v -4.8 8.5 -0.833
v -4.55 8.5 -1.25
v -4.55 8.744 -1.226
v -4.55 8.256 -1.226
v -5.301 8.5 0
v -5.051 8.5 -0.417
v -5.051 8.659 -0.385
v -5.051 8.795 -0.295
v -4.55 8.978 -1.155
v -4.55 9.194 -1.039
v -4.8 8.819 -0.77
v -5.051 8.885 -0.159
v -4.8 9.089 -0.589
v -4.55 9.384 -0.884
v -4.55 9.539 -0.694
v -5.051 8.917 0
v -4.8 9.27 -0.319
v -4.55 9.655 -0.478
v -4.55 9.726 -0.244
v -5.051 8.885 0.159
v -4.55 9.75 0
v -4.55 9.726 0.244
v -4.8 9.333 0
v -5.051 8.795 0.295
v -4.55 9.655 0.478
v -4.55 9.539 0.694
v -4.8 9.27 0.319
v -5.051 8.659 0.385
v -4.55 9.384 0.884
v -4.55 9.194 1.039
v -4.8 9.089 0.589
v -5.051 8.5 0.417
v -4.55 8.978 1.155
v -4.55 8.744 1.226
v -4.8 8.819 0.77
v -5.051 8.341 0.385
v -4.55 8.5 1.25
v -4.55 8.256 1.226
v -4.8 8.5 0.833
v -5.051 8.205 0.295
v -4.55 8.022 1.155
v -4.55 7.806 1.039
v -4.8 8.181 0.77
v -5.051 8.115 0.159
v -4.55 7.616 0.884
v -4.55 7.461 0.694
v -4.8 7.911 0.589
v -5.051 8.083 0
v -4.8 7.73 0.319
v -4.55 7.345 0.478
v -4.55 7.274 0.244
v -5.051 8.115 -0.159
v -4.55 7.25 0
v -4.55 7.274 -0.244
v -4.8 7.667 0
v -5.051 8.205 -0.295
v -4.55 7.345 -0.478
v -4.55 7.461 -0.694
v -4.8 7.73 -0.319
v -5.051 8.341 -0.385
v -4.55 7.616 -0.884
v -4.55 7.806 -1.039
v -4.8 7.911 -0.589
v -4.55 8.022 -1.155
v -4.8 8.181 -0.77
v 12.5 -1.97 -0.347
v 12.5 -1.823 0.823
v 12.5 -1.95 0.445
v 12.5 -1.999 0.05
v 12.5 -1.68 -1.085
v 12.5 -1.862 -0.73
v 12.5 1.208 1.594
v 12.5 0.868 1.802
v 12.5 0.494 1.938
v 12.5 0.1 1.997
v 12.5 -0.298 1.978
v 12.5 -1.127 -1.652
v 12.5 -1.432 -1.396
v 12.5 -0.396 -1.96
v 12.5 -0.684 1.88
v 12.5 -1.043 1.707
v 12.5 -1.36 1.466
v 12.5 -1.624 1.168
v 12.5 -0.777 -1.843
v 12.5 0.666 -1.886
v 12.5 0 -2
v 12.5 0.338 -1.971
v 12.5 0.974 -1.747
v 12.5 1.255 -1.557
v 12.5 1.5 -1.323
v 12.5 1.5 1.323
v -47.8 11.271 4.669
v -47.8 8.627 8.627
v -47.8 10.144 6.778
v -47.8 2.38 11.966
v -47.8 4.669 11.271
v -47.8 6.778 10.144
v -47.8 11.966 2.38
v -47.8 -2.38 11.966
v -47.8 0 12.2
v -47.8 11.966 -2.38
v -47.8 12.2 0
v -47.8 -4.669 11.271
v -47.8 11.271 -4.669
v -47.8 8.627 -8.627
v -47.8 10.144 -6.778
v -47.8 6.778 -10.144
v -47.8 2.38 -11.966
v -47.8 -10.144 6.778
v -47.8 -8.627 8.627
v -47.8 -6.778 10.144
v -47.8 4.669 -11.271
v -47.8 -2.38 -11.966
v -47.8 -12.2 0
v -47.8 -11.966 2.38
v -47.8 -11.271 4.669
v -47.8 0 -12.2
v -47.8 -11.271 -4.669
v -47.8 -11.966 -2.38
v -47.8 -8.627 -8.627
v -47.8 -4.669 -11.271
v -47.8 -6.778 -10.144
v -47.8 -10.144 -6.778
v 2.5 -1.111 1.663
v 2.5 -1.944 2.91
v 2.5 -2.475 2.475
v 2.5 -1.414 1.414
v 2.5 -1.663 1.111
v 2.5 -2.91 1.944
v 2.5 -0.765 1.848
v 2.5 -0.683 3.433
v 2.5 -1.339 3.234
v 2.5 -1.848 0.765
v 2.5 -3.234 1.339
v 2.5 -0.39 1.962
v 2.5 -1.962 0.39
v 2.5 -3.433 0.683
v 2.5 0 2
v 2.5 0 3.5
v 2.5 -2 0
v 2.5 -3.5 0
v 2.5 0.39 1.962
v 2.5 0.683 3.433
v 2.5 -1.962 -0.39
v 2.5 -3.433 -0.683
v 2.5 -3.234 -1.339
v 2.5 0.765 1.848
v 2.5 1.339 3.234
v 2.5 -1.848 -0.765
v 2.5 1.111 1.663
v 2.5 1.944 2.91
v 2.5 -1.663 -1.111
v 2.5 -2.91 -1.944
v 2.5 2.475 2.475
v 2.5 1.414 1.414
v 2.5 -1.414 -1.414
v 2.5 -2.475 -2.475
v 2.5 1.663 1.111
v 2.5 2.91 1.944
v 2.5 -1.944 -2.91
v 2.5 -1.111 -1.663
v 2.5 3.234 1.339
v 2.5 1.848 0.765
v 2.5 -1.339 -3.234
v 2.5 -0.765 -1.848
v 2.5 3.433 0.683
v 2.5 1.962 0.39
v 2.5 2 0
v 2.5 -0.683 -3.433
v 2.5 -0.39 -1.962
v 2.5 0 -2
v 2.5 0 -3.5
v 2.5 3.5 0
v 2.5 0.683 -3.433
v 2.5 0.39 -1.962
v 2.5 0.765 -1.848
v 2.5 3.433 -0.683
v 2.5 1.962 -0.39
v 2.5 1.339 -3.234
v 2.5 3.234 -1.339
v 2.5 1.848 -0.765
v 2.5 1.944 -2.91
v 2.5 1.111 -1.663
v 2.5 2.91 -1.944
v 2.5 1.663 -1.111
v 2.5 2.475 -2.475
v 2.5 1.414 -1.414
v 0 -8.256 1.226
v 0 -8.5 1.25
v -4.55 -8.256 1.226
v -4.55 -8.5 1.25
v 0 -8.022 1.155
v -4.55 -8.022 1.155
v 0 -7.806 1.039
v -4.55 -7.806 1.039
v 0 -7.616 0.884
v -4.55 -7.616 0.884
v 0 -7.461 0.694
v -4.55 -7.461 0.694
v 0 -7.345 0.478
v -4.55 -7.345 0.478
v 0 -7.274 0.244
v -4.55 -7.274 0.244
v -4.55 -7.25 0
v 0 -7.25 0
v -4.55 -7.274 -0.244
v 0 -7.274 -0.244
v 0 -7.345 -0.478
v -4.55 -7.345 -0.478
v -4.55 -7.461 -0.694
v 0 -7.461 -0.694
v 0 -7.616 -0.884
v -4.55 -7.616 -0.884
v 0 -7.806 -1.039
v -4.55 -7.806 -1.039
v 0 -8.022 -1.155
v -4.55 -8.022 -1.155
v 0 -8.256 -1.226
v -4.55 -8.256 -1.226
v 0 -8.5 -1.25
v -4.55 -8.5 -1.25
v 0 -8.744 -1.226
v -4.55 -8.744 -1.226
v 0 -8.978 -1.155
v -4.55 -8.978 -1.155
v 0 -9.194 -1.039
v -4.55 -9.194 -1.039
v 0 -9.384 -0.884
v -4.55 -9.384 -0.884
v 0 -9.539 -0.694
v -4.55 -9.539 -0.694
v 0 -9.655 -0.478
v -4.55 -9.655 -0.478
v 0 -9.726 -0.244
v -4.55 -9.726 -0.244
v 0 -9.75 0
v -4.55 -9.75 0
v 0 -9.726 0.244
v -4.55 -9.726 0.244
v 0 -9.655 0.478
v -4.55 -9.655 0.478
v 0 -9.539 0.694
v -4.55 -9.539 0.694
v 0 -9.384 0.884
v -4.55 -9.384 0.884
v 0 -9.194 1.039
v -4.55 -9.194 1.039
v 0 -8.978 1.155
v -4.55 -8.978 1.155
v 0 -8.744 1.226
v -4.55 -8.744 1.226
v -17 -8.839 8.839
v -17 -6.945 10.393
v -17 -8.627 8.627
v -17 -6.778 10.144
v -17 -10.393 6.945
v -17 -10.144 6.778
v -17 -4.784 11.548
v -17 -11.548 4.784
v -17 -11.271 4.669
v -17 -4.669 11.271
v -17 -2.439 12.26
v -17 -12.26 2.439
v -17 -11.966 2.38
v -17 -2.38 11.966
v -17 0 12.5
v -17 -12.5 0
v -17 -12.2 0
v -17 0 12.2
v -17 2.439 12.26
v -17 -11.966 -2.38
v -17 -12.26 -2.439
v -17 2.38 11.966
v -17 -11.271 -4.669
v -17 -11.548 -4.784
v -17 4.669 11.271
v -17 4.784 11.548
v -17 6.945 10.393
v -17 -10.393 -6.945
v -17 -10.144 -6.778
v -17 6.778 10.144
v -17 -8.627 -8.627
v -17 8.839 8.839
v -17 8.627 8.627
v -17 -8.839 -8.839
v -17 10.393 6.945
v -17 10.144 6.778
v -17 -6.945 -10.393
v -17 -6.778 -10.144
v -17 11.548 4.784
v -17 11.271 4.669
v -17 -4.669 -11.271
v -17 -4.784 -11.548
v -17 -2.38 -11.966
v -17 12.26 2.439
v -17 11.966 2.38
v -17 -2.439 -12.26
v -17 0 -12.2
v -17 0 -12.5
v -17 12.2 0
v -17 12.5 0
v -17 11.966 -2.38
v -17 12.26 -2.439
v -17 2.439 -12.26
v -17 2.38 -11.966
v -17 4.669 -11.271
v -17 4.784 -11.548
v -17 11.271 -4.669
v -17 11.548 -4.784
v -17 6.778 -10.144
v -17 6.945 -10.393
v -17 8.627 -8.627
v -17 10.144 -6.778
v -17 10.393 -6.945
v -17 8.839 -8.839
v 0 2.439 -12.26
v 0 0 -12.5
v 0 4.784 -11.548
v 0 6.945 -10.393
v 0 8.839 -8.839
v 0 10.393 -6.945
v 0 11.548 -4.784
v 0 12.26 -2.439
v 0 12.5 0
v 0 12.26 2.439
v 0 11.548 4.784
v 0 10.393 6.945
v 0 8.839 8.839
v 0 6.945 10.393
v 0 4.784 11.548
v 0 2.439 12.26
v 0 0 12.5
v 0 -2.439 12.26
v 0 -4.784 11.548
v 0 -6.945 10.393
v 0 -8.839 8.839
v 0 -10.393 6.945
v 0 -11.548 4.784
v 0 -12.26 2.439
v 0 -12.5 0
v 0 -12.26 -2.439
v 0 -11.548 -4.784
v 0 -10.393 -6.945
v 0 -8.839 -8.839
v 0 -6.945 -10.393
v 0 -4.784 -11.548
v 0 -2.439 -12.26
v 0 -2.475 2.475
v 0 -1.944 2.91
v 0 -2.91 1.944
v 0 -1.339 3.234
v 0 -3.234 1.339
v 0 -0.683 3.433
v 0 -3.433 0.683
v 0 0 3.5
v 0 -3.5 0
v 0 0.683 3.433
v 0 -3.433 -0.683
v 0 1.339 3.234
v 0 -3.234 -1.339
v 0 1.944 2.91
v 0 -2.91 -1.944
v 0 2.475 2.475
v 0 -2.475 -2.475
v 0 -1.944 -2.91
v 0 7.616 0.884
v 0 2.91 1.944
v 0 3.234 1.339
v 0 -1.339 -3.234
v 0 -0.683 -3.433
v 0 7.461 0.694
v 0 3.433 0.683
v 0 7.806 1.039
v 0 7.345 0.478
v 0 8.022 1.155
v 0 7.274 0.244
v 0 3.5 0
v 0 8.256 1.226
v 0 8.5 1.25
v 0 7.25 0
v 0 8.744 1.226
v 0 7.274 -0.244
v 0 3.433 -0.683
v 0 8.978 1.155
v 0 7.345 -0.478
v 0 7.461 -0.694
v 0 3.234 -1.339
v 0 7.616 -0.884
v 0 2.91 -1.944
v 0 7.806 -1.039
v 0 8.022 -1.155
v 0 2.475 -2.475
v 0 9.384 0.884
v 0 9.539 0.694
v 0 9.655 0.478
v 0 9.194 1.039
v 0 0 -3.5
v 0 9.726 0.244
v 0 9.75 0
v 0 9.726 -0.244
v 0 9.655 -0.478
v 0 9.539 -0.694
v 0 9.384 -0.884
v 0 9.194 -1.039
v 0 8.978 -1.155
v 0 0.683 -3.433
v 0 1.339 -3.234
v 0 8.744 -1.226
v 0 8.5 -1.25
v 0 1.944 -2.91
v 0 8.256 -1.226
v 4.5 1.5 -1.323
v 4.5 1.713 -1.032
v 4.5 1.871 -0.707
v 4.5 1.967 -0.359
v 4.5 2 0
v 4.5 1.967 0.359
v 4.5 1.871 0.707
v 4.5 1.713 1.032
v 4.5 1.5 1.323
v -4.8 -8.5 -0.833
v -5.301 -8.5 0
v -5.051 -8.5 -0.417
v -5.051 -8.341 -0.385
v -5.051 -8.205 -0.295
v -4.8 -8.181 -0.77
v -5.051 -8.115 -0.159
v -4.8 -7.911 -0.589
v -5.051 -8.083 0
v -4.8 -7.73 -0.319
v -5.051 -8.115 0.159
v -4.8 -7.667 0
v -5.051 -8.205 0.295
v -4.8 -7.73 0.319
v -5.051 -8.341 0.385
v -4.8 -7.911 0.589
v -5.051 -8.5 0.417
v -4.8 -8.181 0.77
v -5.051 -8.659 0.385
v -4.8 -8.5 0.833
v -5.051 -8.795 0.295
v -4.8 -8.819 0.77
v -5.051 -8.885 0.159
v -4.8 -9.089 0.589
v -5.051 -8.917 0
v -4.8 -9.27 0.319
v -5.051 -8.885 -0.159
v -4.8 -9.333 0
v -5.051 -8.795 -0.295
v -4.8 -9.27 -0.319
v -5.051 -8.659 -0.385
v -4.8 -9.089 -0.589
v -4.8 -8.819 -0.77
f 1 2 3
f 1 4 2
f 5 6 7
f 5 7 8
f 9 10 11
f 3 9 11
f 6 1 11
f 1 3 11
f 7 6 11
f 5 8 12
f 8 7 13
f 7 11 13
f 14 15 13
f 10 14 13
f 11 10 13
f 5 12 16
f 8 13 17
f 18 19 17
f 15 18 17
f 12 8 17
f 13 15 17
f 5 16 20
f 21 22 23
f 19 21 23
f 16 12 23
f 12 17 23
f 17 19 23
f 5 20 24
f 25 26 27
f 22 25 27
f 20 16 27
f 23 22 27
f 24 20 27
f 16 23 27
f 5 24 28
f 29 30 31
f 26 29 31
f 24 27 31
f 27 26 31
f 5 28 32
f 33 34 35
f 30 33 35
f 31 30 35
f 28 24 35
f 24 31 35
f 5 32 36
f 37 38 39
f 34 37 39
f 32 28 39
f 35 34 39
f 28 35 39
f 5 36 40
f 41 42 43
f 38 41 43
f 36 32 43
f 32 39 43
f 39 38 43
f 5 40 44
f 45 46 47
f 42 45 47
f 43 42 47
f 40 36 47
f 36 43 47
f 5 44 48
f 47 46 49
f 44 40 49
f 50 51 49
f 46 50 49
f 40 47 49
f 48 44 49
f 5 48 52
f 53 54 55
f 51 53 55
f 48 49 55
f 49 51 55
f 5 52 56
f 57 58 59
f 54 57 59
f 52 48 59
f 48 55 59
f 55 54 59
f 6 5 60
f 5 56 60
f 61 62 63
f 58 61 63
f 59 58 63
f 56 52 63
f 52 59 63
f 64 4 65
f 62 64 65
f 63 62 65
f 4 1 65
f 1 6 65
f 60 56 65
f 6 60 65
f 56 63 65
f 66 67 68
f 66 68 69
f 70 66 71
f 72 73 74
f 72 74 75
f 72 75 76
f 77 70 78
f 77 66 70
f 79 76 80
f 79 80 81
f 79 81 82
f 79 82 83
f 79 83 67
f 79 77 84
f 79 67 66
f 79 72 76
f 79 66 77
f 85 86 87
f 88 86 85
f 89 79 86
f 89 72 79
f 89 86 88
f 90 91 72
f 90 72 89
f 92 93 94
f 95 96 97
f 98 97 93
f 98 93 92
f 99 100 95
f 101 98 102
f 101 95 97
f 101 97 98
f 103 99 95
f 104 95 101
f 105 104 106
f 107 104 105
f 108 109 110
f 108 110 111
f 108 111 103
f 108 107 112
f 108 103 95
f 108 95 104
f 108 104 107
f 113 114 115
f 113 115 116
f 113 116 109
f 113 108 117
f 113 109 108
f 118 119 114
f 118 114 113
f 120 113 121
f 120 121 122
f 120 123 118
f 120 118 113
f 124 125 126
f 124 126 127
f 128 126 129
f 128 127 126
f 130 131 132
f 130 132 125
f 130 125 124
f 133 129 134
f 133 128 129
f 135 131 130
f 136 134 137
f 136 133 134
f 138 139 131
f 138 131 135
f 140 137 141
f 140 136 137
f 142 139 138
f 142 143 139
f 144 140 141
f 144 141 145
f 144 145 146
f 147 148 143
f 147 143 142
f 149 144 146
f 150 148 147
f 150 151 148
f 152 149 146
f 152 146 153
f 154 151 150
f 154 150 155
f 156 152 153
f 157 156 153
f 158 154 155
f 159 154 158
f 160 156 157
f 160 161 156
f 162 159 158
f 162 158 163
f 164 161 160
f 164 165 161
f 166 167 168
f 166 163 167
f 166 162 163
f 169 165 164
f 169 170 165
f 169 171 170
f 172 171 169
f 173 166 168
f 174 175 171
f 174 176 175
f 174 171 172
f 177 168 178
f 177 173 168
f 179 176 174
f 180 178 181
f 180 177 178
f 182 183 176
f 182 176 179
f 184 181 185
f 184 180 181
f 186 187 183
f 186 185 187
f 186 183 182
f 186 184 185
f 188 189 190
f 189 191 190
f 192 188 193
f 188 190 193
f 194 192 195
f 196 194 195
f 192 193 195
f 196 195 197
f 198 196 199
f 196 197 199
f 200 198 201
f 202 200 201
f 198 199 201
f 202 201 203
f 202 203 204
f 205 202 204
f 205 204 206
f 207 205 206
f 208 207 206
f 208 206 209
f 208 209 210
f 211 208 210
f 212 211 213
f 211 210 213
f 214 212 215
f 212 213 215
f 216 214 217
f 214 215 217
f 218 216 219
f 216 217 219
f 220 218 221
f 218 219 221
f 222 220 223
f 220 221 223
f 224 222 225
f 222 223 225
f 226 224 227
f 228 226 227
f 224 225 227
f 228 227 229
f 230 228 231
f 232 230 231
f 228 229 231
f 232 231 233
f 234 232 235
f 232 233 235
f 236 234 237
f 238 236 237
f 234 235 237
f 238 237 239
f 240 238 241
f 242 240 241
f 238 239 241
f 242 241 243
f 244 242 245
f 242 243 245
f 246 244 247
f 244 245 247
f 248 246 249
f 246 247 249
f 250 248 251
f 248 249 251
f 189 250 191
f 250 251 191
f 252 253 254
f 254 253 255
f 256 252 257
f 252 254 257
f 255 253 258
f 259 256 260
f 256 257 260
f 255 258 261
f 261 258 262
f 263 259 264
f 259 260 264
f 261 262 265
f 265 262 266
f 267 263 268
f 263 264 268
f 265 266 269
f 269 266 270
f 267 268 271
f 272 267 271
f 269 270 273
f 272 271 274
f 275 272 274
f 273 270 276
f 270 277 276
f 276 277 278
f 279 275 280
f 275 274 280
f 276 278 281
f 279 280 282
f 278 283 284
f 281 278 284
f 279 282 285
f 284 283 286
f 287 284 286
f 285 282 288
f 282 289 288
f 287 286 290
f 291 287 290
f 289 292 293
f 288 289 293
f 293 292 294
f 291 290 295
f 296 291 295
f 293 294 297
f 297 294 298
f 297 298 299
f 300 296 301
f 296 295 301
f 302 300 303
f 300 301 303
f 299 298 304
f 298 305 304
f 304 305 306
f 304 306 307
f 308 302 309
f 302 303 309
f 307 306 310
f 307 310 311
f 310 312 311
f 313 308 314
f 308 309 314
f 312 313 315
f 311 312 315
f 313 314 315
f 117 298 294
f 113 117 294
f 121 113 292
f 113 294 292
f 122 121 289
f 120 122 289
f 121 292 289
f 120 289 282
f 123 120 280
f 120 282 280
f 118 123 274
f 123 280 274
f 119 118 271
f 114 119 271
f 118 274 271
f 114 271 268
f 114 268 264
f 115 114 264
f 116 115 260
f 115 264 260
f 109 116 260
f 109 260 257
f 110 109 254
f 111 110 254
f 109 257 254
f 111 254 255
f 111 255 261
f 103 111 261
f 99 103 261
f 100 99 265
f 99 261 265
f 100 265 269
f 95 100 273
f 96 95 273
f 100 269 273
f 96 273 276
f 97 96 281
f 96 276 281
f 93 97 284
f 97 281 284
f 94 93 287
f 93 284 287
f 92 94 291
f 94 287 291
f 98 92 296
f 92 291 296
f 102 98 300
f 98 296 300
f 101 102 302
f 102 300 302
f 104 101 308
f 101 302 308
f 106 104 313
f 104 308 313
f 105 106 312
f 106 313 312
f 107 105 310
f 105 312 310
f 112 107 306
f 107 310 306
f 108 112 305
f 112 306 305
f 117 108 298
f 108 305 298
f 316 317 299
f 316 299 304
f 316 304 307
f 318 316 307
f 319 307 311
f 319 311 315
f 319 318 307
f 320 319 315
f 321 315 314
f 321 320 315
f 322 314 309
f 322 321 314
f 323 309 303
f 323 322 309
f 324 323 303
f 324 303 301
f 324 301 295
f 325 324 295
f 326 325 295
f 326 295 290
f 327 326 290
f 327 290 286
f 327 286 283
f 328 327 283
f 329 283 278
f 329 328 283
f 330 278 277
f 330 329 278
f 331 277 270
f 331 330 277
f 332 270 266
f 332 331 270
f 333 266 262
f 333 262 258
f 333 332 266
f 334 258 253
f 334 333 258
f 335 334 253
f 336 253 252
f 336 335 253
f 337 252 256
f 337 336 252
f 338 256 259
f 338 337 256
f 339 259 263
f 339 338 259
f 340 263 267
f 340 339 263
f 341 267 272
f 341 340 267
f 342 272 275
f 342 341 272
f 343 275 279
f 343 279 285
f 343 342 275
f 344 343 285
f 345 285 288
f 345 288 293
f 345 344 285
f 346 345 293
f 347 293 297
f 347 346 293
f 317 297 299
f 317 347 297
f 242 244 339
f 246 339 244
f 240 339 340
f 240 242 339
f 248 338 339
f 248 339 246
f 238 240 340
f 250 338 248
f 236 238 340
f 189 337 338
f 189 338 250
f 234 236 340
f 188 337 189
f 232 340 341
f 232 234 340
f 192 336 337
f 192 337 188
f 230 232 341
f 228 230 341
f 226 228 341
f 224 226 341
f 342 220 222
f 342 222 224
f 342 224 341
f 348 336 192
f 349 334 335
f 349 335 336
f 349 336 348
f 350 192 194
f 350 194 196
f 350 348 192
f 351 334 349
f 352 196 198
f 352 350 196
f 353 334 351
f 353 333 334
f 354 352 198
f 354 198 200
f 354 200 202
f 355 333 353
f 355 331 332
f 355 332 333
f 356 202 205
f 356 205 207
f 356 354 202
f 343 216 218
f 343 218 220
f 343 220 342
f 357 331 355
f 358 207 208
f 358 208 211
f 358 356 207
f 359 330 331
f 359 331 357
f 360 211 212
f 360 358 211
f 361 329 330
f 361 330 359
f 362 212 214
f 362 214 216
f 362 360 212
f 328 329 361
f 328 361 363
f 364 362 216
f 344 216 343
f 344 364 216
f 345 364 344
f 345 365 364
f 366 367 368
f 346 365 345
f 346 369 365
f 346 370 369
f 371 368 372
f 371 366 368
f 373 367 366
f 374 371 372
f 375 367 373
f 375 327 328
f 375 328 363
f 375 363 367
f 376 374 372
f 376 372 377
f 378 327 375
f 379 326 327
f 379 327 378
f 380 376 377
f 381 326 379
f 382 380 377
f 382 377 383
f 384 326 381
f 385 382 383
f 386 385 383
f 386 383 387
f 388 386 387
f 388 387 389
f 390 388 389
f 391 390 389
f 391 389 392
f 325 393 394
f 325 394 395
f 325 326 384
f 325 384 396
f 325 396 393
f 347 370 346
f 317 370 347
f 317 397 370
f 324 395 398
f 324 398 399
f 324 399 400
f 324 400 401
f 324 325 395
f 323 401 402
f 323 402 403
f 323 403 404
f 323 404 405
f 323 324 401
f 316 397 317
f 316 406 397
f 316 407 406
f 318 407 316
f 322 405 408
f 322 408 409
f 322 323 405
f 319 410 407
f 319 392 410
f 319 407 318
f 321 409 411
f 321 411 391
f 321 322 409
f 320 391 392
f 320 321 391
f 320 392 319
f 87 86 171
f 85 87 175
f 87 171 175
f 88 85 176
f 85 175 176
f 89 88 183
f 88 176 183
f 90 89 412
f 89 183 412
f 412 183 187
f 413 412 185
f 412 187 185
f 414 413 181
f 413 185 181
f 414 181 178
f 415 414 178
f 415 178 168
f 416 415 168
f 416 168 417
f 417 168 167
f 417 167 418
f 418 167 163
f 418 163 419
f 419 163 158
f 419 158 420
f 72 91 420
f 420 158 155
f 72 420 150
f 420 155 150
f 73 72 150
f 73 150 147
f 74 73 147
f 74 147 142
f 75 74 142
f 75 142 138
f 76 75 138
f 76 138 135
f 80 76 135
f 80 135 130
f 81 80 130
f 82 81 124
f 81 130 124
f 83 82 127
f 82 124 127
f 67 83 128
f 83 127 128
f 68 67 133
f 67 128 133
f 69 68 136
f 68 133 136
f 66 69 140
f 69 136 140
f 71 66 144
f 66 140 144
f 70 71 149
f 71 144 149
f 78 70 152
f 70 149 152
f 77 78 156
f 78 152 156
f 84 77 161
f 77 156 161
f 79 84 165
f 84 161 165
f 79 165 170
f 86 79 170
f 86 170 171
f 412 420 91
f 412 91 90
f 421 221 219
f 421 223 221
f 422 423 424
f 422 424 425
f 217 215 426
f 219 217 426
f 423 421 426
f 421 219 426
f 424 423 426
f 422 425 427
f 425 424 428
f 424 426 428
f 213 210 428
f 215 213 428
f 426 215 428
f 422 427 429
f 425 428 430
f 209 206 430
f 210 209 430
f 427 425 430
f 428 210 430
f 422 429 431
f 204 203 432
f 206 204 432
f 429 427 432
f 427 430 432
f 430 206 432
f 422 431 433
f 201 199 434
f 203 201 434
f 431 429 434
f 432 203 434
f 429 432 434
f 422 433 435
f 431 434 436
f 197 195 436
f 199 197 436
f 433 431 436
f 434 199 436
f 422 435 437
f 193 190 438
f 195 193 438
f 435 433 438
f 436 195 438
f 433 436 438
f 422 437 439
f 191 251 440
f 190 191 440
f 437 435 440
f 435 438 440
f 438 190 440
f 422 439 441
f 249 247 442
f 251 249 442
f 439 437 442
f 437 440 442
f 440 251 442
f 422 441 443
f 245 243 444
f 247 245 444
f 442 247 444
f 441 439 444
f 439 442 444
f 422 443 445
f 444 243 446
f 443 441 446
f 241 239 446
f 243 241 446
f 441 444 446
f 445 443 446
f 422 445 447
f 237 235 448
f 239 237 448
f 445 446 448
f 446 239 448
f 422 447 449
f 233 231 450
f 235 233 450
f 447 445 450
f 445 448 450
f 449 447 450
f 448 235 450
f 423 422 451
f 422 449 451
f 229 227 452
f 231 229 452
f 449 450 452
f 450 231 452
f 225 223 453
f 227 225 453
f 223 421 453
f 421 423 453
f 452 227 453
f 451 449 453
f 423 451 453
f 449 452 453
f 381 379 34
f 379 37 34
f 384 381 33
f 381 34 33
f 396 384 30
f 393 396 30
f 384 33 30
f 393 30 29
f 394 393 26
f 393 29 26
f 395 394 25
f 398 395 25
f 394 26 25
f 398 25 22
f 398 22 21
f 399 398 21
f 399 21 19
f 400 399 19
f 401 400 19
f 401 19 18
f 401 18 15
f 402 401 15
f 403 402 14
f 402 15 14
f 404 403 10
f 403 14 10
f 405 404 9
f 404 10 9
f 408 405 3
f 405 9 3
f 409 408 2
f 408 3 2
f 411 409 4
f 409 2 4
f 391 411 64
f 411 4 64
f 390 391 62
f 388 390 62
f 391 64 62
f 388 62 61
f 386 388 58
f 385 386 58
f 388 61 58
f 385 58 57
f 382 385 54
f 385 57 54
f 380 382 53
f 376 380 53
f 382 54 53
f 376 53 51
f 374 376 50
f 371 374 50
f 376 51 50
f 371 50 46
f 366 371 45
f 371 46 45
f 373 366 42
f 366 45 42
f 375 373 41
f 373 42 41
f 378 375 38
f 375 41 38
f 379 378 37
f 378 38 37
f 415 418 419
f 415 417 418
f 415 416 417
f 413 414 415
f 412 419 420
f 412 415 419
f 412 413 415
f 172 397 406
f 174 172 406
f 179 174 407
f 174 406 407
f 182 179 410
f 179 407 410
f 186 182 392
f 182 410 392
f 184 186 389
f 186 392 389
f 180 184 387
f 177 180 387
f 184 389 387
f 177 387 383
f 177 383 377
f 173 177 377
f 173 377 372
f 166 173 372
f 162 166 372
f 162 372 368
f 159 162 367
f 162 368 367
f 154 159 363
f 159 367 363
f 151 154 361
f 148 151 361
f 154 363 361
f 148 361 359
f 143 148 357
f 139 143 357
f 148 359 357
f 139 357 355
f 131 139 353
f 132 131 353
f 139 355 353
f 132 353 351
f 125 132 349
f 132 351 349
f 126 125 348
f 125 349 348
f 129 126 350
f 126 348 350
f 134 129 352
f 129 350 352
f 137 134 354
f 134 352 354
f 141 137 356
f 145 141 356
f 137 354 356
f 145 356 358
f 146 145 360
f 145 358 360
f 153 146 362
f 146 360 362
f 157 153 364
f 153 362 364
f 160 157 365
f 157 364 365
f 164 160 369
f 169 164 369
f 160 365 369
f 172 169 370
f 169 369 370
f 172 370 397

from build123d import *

# Parameters (mm, degrees)
SKETCH2_R               = 12.5
BOSS_EXTRUDE1_DEPTH     = 17
SKETCH3_R               = 12.2
BOSS_EXTRUDE2_DEPTH     = 30.8
SKETCH4_R               = 3.5
BOSS_EXTRUDE3_DEPTH     = 2.5
SKETCH5_R               = 2
BOSS_EXTRUDE4_DEPTH     = 10
CUT_EXTRUDE1_DEPTH      = 63.837807091
CUT_EXTRUDE1_DEPTH_BACK = 8
M3_TAPPED_HOLE1_D       = 2.5
M3_TAPPED_HOLE1_DEPTH   = 4.55
M3_TAPPED_HOLE1_TIP     = 0.751075774


with BuildPart() as part:
    # Sketch2 → Boss-Extrude1 (new body)
    with BuildSketch(Plane(origin=(0, 0, 0), x_dir=(0, 0, -1), z_dir=(1, 0, 0))):
        Circle(SKETCH2_R)
    extrude(amount=-BOSS_EXTRUDE1_DEPTH)

    # Sketch3 → Boss-Extrude2 (add)
    with BuildSketch(Plane.ZY.offset(17)):
        with Locations(Location((0, 0, 0), (0, 0, 180))):
            Circle(SKETCH3_R)
    extrude(amount=BOSS_EXTRUDE2_DEPTH)

    # Sketch4 → Boss-Extrude3 (add)
    with BuildSketch(Plane(origin=(0, 0, 0), x_dir=(0, 0, -1), z_dir=(1, 0, 0))):
        Circle(SKETCH4_R)
    extrude(amount=BOSS_EXTRUDE3_DEPTH)

    # Sketch5 → Boss-Extrude4 (add)
    with BuildSketch(Plane(origin=(2.5, 0, 0), x_dir=(0, 0, -1), z_dir=(1, 0, 0))):
        Circle(SKETCH5_R)
    extrude(amount=BOSS_EXTRUDE4_DEPTH)

    # Sketch6 → Cut-Extrude1 (cut, two sides: drawn at the far end of the back side and taken through both)
    with BuildSketch(Plane(origin=(12.5, 0, 0), x_dir=(0, 0, -1), z_dir=(1, 0, 0)).offset(-CUT_EXTRUDE1_DEPTH_BACK)):
        Polygon((-50.671161076, 1.5), (-1.322875656, 1.5), (1.322875656, 1.5), (50.671161076, 1.5), (50.671161076, 100.196570842), (-50.671161076, 100.196570842), align=None)
    extrude(amount=CUT_EXTRUDE1_DEPTH + CUT_EXTRUDE1_DEPTH_BACK, mode=Mode.SUBTRACT)

    # M3 Tapped Hole1
    with Locations(Plane(origin=(0, 0, 0), x_dir=(0, 0, -1), z_dir=(1, 0, 0))):
        with Locations((0, 8.5), (0, -8.5)):
            Hole(M3_TAPPED_HOLE1_D / 2, depth=M3_TAPPED_HOLE1_DEPTH)
            with Locations((0, 0, -(M3_TAPPED_HOLE1_DEPTH + M3_TAPPED_HOLE1_TIP / 2))):  # 118° drill point
                Cone(0, M3_TAPPED_HOLE1_D / 2, M3_TAPPED_HOLE1_TIP, mode=Mode.SUBTRACT)


solid = part.part
